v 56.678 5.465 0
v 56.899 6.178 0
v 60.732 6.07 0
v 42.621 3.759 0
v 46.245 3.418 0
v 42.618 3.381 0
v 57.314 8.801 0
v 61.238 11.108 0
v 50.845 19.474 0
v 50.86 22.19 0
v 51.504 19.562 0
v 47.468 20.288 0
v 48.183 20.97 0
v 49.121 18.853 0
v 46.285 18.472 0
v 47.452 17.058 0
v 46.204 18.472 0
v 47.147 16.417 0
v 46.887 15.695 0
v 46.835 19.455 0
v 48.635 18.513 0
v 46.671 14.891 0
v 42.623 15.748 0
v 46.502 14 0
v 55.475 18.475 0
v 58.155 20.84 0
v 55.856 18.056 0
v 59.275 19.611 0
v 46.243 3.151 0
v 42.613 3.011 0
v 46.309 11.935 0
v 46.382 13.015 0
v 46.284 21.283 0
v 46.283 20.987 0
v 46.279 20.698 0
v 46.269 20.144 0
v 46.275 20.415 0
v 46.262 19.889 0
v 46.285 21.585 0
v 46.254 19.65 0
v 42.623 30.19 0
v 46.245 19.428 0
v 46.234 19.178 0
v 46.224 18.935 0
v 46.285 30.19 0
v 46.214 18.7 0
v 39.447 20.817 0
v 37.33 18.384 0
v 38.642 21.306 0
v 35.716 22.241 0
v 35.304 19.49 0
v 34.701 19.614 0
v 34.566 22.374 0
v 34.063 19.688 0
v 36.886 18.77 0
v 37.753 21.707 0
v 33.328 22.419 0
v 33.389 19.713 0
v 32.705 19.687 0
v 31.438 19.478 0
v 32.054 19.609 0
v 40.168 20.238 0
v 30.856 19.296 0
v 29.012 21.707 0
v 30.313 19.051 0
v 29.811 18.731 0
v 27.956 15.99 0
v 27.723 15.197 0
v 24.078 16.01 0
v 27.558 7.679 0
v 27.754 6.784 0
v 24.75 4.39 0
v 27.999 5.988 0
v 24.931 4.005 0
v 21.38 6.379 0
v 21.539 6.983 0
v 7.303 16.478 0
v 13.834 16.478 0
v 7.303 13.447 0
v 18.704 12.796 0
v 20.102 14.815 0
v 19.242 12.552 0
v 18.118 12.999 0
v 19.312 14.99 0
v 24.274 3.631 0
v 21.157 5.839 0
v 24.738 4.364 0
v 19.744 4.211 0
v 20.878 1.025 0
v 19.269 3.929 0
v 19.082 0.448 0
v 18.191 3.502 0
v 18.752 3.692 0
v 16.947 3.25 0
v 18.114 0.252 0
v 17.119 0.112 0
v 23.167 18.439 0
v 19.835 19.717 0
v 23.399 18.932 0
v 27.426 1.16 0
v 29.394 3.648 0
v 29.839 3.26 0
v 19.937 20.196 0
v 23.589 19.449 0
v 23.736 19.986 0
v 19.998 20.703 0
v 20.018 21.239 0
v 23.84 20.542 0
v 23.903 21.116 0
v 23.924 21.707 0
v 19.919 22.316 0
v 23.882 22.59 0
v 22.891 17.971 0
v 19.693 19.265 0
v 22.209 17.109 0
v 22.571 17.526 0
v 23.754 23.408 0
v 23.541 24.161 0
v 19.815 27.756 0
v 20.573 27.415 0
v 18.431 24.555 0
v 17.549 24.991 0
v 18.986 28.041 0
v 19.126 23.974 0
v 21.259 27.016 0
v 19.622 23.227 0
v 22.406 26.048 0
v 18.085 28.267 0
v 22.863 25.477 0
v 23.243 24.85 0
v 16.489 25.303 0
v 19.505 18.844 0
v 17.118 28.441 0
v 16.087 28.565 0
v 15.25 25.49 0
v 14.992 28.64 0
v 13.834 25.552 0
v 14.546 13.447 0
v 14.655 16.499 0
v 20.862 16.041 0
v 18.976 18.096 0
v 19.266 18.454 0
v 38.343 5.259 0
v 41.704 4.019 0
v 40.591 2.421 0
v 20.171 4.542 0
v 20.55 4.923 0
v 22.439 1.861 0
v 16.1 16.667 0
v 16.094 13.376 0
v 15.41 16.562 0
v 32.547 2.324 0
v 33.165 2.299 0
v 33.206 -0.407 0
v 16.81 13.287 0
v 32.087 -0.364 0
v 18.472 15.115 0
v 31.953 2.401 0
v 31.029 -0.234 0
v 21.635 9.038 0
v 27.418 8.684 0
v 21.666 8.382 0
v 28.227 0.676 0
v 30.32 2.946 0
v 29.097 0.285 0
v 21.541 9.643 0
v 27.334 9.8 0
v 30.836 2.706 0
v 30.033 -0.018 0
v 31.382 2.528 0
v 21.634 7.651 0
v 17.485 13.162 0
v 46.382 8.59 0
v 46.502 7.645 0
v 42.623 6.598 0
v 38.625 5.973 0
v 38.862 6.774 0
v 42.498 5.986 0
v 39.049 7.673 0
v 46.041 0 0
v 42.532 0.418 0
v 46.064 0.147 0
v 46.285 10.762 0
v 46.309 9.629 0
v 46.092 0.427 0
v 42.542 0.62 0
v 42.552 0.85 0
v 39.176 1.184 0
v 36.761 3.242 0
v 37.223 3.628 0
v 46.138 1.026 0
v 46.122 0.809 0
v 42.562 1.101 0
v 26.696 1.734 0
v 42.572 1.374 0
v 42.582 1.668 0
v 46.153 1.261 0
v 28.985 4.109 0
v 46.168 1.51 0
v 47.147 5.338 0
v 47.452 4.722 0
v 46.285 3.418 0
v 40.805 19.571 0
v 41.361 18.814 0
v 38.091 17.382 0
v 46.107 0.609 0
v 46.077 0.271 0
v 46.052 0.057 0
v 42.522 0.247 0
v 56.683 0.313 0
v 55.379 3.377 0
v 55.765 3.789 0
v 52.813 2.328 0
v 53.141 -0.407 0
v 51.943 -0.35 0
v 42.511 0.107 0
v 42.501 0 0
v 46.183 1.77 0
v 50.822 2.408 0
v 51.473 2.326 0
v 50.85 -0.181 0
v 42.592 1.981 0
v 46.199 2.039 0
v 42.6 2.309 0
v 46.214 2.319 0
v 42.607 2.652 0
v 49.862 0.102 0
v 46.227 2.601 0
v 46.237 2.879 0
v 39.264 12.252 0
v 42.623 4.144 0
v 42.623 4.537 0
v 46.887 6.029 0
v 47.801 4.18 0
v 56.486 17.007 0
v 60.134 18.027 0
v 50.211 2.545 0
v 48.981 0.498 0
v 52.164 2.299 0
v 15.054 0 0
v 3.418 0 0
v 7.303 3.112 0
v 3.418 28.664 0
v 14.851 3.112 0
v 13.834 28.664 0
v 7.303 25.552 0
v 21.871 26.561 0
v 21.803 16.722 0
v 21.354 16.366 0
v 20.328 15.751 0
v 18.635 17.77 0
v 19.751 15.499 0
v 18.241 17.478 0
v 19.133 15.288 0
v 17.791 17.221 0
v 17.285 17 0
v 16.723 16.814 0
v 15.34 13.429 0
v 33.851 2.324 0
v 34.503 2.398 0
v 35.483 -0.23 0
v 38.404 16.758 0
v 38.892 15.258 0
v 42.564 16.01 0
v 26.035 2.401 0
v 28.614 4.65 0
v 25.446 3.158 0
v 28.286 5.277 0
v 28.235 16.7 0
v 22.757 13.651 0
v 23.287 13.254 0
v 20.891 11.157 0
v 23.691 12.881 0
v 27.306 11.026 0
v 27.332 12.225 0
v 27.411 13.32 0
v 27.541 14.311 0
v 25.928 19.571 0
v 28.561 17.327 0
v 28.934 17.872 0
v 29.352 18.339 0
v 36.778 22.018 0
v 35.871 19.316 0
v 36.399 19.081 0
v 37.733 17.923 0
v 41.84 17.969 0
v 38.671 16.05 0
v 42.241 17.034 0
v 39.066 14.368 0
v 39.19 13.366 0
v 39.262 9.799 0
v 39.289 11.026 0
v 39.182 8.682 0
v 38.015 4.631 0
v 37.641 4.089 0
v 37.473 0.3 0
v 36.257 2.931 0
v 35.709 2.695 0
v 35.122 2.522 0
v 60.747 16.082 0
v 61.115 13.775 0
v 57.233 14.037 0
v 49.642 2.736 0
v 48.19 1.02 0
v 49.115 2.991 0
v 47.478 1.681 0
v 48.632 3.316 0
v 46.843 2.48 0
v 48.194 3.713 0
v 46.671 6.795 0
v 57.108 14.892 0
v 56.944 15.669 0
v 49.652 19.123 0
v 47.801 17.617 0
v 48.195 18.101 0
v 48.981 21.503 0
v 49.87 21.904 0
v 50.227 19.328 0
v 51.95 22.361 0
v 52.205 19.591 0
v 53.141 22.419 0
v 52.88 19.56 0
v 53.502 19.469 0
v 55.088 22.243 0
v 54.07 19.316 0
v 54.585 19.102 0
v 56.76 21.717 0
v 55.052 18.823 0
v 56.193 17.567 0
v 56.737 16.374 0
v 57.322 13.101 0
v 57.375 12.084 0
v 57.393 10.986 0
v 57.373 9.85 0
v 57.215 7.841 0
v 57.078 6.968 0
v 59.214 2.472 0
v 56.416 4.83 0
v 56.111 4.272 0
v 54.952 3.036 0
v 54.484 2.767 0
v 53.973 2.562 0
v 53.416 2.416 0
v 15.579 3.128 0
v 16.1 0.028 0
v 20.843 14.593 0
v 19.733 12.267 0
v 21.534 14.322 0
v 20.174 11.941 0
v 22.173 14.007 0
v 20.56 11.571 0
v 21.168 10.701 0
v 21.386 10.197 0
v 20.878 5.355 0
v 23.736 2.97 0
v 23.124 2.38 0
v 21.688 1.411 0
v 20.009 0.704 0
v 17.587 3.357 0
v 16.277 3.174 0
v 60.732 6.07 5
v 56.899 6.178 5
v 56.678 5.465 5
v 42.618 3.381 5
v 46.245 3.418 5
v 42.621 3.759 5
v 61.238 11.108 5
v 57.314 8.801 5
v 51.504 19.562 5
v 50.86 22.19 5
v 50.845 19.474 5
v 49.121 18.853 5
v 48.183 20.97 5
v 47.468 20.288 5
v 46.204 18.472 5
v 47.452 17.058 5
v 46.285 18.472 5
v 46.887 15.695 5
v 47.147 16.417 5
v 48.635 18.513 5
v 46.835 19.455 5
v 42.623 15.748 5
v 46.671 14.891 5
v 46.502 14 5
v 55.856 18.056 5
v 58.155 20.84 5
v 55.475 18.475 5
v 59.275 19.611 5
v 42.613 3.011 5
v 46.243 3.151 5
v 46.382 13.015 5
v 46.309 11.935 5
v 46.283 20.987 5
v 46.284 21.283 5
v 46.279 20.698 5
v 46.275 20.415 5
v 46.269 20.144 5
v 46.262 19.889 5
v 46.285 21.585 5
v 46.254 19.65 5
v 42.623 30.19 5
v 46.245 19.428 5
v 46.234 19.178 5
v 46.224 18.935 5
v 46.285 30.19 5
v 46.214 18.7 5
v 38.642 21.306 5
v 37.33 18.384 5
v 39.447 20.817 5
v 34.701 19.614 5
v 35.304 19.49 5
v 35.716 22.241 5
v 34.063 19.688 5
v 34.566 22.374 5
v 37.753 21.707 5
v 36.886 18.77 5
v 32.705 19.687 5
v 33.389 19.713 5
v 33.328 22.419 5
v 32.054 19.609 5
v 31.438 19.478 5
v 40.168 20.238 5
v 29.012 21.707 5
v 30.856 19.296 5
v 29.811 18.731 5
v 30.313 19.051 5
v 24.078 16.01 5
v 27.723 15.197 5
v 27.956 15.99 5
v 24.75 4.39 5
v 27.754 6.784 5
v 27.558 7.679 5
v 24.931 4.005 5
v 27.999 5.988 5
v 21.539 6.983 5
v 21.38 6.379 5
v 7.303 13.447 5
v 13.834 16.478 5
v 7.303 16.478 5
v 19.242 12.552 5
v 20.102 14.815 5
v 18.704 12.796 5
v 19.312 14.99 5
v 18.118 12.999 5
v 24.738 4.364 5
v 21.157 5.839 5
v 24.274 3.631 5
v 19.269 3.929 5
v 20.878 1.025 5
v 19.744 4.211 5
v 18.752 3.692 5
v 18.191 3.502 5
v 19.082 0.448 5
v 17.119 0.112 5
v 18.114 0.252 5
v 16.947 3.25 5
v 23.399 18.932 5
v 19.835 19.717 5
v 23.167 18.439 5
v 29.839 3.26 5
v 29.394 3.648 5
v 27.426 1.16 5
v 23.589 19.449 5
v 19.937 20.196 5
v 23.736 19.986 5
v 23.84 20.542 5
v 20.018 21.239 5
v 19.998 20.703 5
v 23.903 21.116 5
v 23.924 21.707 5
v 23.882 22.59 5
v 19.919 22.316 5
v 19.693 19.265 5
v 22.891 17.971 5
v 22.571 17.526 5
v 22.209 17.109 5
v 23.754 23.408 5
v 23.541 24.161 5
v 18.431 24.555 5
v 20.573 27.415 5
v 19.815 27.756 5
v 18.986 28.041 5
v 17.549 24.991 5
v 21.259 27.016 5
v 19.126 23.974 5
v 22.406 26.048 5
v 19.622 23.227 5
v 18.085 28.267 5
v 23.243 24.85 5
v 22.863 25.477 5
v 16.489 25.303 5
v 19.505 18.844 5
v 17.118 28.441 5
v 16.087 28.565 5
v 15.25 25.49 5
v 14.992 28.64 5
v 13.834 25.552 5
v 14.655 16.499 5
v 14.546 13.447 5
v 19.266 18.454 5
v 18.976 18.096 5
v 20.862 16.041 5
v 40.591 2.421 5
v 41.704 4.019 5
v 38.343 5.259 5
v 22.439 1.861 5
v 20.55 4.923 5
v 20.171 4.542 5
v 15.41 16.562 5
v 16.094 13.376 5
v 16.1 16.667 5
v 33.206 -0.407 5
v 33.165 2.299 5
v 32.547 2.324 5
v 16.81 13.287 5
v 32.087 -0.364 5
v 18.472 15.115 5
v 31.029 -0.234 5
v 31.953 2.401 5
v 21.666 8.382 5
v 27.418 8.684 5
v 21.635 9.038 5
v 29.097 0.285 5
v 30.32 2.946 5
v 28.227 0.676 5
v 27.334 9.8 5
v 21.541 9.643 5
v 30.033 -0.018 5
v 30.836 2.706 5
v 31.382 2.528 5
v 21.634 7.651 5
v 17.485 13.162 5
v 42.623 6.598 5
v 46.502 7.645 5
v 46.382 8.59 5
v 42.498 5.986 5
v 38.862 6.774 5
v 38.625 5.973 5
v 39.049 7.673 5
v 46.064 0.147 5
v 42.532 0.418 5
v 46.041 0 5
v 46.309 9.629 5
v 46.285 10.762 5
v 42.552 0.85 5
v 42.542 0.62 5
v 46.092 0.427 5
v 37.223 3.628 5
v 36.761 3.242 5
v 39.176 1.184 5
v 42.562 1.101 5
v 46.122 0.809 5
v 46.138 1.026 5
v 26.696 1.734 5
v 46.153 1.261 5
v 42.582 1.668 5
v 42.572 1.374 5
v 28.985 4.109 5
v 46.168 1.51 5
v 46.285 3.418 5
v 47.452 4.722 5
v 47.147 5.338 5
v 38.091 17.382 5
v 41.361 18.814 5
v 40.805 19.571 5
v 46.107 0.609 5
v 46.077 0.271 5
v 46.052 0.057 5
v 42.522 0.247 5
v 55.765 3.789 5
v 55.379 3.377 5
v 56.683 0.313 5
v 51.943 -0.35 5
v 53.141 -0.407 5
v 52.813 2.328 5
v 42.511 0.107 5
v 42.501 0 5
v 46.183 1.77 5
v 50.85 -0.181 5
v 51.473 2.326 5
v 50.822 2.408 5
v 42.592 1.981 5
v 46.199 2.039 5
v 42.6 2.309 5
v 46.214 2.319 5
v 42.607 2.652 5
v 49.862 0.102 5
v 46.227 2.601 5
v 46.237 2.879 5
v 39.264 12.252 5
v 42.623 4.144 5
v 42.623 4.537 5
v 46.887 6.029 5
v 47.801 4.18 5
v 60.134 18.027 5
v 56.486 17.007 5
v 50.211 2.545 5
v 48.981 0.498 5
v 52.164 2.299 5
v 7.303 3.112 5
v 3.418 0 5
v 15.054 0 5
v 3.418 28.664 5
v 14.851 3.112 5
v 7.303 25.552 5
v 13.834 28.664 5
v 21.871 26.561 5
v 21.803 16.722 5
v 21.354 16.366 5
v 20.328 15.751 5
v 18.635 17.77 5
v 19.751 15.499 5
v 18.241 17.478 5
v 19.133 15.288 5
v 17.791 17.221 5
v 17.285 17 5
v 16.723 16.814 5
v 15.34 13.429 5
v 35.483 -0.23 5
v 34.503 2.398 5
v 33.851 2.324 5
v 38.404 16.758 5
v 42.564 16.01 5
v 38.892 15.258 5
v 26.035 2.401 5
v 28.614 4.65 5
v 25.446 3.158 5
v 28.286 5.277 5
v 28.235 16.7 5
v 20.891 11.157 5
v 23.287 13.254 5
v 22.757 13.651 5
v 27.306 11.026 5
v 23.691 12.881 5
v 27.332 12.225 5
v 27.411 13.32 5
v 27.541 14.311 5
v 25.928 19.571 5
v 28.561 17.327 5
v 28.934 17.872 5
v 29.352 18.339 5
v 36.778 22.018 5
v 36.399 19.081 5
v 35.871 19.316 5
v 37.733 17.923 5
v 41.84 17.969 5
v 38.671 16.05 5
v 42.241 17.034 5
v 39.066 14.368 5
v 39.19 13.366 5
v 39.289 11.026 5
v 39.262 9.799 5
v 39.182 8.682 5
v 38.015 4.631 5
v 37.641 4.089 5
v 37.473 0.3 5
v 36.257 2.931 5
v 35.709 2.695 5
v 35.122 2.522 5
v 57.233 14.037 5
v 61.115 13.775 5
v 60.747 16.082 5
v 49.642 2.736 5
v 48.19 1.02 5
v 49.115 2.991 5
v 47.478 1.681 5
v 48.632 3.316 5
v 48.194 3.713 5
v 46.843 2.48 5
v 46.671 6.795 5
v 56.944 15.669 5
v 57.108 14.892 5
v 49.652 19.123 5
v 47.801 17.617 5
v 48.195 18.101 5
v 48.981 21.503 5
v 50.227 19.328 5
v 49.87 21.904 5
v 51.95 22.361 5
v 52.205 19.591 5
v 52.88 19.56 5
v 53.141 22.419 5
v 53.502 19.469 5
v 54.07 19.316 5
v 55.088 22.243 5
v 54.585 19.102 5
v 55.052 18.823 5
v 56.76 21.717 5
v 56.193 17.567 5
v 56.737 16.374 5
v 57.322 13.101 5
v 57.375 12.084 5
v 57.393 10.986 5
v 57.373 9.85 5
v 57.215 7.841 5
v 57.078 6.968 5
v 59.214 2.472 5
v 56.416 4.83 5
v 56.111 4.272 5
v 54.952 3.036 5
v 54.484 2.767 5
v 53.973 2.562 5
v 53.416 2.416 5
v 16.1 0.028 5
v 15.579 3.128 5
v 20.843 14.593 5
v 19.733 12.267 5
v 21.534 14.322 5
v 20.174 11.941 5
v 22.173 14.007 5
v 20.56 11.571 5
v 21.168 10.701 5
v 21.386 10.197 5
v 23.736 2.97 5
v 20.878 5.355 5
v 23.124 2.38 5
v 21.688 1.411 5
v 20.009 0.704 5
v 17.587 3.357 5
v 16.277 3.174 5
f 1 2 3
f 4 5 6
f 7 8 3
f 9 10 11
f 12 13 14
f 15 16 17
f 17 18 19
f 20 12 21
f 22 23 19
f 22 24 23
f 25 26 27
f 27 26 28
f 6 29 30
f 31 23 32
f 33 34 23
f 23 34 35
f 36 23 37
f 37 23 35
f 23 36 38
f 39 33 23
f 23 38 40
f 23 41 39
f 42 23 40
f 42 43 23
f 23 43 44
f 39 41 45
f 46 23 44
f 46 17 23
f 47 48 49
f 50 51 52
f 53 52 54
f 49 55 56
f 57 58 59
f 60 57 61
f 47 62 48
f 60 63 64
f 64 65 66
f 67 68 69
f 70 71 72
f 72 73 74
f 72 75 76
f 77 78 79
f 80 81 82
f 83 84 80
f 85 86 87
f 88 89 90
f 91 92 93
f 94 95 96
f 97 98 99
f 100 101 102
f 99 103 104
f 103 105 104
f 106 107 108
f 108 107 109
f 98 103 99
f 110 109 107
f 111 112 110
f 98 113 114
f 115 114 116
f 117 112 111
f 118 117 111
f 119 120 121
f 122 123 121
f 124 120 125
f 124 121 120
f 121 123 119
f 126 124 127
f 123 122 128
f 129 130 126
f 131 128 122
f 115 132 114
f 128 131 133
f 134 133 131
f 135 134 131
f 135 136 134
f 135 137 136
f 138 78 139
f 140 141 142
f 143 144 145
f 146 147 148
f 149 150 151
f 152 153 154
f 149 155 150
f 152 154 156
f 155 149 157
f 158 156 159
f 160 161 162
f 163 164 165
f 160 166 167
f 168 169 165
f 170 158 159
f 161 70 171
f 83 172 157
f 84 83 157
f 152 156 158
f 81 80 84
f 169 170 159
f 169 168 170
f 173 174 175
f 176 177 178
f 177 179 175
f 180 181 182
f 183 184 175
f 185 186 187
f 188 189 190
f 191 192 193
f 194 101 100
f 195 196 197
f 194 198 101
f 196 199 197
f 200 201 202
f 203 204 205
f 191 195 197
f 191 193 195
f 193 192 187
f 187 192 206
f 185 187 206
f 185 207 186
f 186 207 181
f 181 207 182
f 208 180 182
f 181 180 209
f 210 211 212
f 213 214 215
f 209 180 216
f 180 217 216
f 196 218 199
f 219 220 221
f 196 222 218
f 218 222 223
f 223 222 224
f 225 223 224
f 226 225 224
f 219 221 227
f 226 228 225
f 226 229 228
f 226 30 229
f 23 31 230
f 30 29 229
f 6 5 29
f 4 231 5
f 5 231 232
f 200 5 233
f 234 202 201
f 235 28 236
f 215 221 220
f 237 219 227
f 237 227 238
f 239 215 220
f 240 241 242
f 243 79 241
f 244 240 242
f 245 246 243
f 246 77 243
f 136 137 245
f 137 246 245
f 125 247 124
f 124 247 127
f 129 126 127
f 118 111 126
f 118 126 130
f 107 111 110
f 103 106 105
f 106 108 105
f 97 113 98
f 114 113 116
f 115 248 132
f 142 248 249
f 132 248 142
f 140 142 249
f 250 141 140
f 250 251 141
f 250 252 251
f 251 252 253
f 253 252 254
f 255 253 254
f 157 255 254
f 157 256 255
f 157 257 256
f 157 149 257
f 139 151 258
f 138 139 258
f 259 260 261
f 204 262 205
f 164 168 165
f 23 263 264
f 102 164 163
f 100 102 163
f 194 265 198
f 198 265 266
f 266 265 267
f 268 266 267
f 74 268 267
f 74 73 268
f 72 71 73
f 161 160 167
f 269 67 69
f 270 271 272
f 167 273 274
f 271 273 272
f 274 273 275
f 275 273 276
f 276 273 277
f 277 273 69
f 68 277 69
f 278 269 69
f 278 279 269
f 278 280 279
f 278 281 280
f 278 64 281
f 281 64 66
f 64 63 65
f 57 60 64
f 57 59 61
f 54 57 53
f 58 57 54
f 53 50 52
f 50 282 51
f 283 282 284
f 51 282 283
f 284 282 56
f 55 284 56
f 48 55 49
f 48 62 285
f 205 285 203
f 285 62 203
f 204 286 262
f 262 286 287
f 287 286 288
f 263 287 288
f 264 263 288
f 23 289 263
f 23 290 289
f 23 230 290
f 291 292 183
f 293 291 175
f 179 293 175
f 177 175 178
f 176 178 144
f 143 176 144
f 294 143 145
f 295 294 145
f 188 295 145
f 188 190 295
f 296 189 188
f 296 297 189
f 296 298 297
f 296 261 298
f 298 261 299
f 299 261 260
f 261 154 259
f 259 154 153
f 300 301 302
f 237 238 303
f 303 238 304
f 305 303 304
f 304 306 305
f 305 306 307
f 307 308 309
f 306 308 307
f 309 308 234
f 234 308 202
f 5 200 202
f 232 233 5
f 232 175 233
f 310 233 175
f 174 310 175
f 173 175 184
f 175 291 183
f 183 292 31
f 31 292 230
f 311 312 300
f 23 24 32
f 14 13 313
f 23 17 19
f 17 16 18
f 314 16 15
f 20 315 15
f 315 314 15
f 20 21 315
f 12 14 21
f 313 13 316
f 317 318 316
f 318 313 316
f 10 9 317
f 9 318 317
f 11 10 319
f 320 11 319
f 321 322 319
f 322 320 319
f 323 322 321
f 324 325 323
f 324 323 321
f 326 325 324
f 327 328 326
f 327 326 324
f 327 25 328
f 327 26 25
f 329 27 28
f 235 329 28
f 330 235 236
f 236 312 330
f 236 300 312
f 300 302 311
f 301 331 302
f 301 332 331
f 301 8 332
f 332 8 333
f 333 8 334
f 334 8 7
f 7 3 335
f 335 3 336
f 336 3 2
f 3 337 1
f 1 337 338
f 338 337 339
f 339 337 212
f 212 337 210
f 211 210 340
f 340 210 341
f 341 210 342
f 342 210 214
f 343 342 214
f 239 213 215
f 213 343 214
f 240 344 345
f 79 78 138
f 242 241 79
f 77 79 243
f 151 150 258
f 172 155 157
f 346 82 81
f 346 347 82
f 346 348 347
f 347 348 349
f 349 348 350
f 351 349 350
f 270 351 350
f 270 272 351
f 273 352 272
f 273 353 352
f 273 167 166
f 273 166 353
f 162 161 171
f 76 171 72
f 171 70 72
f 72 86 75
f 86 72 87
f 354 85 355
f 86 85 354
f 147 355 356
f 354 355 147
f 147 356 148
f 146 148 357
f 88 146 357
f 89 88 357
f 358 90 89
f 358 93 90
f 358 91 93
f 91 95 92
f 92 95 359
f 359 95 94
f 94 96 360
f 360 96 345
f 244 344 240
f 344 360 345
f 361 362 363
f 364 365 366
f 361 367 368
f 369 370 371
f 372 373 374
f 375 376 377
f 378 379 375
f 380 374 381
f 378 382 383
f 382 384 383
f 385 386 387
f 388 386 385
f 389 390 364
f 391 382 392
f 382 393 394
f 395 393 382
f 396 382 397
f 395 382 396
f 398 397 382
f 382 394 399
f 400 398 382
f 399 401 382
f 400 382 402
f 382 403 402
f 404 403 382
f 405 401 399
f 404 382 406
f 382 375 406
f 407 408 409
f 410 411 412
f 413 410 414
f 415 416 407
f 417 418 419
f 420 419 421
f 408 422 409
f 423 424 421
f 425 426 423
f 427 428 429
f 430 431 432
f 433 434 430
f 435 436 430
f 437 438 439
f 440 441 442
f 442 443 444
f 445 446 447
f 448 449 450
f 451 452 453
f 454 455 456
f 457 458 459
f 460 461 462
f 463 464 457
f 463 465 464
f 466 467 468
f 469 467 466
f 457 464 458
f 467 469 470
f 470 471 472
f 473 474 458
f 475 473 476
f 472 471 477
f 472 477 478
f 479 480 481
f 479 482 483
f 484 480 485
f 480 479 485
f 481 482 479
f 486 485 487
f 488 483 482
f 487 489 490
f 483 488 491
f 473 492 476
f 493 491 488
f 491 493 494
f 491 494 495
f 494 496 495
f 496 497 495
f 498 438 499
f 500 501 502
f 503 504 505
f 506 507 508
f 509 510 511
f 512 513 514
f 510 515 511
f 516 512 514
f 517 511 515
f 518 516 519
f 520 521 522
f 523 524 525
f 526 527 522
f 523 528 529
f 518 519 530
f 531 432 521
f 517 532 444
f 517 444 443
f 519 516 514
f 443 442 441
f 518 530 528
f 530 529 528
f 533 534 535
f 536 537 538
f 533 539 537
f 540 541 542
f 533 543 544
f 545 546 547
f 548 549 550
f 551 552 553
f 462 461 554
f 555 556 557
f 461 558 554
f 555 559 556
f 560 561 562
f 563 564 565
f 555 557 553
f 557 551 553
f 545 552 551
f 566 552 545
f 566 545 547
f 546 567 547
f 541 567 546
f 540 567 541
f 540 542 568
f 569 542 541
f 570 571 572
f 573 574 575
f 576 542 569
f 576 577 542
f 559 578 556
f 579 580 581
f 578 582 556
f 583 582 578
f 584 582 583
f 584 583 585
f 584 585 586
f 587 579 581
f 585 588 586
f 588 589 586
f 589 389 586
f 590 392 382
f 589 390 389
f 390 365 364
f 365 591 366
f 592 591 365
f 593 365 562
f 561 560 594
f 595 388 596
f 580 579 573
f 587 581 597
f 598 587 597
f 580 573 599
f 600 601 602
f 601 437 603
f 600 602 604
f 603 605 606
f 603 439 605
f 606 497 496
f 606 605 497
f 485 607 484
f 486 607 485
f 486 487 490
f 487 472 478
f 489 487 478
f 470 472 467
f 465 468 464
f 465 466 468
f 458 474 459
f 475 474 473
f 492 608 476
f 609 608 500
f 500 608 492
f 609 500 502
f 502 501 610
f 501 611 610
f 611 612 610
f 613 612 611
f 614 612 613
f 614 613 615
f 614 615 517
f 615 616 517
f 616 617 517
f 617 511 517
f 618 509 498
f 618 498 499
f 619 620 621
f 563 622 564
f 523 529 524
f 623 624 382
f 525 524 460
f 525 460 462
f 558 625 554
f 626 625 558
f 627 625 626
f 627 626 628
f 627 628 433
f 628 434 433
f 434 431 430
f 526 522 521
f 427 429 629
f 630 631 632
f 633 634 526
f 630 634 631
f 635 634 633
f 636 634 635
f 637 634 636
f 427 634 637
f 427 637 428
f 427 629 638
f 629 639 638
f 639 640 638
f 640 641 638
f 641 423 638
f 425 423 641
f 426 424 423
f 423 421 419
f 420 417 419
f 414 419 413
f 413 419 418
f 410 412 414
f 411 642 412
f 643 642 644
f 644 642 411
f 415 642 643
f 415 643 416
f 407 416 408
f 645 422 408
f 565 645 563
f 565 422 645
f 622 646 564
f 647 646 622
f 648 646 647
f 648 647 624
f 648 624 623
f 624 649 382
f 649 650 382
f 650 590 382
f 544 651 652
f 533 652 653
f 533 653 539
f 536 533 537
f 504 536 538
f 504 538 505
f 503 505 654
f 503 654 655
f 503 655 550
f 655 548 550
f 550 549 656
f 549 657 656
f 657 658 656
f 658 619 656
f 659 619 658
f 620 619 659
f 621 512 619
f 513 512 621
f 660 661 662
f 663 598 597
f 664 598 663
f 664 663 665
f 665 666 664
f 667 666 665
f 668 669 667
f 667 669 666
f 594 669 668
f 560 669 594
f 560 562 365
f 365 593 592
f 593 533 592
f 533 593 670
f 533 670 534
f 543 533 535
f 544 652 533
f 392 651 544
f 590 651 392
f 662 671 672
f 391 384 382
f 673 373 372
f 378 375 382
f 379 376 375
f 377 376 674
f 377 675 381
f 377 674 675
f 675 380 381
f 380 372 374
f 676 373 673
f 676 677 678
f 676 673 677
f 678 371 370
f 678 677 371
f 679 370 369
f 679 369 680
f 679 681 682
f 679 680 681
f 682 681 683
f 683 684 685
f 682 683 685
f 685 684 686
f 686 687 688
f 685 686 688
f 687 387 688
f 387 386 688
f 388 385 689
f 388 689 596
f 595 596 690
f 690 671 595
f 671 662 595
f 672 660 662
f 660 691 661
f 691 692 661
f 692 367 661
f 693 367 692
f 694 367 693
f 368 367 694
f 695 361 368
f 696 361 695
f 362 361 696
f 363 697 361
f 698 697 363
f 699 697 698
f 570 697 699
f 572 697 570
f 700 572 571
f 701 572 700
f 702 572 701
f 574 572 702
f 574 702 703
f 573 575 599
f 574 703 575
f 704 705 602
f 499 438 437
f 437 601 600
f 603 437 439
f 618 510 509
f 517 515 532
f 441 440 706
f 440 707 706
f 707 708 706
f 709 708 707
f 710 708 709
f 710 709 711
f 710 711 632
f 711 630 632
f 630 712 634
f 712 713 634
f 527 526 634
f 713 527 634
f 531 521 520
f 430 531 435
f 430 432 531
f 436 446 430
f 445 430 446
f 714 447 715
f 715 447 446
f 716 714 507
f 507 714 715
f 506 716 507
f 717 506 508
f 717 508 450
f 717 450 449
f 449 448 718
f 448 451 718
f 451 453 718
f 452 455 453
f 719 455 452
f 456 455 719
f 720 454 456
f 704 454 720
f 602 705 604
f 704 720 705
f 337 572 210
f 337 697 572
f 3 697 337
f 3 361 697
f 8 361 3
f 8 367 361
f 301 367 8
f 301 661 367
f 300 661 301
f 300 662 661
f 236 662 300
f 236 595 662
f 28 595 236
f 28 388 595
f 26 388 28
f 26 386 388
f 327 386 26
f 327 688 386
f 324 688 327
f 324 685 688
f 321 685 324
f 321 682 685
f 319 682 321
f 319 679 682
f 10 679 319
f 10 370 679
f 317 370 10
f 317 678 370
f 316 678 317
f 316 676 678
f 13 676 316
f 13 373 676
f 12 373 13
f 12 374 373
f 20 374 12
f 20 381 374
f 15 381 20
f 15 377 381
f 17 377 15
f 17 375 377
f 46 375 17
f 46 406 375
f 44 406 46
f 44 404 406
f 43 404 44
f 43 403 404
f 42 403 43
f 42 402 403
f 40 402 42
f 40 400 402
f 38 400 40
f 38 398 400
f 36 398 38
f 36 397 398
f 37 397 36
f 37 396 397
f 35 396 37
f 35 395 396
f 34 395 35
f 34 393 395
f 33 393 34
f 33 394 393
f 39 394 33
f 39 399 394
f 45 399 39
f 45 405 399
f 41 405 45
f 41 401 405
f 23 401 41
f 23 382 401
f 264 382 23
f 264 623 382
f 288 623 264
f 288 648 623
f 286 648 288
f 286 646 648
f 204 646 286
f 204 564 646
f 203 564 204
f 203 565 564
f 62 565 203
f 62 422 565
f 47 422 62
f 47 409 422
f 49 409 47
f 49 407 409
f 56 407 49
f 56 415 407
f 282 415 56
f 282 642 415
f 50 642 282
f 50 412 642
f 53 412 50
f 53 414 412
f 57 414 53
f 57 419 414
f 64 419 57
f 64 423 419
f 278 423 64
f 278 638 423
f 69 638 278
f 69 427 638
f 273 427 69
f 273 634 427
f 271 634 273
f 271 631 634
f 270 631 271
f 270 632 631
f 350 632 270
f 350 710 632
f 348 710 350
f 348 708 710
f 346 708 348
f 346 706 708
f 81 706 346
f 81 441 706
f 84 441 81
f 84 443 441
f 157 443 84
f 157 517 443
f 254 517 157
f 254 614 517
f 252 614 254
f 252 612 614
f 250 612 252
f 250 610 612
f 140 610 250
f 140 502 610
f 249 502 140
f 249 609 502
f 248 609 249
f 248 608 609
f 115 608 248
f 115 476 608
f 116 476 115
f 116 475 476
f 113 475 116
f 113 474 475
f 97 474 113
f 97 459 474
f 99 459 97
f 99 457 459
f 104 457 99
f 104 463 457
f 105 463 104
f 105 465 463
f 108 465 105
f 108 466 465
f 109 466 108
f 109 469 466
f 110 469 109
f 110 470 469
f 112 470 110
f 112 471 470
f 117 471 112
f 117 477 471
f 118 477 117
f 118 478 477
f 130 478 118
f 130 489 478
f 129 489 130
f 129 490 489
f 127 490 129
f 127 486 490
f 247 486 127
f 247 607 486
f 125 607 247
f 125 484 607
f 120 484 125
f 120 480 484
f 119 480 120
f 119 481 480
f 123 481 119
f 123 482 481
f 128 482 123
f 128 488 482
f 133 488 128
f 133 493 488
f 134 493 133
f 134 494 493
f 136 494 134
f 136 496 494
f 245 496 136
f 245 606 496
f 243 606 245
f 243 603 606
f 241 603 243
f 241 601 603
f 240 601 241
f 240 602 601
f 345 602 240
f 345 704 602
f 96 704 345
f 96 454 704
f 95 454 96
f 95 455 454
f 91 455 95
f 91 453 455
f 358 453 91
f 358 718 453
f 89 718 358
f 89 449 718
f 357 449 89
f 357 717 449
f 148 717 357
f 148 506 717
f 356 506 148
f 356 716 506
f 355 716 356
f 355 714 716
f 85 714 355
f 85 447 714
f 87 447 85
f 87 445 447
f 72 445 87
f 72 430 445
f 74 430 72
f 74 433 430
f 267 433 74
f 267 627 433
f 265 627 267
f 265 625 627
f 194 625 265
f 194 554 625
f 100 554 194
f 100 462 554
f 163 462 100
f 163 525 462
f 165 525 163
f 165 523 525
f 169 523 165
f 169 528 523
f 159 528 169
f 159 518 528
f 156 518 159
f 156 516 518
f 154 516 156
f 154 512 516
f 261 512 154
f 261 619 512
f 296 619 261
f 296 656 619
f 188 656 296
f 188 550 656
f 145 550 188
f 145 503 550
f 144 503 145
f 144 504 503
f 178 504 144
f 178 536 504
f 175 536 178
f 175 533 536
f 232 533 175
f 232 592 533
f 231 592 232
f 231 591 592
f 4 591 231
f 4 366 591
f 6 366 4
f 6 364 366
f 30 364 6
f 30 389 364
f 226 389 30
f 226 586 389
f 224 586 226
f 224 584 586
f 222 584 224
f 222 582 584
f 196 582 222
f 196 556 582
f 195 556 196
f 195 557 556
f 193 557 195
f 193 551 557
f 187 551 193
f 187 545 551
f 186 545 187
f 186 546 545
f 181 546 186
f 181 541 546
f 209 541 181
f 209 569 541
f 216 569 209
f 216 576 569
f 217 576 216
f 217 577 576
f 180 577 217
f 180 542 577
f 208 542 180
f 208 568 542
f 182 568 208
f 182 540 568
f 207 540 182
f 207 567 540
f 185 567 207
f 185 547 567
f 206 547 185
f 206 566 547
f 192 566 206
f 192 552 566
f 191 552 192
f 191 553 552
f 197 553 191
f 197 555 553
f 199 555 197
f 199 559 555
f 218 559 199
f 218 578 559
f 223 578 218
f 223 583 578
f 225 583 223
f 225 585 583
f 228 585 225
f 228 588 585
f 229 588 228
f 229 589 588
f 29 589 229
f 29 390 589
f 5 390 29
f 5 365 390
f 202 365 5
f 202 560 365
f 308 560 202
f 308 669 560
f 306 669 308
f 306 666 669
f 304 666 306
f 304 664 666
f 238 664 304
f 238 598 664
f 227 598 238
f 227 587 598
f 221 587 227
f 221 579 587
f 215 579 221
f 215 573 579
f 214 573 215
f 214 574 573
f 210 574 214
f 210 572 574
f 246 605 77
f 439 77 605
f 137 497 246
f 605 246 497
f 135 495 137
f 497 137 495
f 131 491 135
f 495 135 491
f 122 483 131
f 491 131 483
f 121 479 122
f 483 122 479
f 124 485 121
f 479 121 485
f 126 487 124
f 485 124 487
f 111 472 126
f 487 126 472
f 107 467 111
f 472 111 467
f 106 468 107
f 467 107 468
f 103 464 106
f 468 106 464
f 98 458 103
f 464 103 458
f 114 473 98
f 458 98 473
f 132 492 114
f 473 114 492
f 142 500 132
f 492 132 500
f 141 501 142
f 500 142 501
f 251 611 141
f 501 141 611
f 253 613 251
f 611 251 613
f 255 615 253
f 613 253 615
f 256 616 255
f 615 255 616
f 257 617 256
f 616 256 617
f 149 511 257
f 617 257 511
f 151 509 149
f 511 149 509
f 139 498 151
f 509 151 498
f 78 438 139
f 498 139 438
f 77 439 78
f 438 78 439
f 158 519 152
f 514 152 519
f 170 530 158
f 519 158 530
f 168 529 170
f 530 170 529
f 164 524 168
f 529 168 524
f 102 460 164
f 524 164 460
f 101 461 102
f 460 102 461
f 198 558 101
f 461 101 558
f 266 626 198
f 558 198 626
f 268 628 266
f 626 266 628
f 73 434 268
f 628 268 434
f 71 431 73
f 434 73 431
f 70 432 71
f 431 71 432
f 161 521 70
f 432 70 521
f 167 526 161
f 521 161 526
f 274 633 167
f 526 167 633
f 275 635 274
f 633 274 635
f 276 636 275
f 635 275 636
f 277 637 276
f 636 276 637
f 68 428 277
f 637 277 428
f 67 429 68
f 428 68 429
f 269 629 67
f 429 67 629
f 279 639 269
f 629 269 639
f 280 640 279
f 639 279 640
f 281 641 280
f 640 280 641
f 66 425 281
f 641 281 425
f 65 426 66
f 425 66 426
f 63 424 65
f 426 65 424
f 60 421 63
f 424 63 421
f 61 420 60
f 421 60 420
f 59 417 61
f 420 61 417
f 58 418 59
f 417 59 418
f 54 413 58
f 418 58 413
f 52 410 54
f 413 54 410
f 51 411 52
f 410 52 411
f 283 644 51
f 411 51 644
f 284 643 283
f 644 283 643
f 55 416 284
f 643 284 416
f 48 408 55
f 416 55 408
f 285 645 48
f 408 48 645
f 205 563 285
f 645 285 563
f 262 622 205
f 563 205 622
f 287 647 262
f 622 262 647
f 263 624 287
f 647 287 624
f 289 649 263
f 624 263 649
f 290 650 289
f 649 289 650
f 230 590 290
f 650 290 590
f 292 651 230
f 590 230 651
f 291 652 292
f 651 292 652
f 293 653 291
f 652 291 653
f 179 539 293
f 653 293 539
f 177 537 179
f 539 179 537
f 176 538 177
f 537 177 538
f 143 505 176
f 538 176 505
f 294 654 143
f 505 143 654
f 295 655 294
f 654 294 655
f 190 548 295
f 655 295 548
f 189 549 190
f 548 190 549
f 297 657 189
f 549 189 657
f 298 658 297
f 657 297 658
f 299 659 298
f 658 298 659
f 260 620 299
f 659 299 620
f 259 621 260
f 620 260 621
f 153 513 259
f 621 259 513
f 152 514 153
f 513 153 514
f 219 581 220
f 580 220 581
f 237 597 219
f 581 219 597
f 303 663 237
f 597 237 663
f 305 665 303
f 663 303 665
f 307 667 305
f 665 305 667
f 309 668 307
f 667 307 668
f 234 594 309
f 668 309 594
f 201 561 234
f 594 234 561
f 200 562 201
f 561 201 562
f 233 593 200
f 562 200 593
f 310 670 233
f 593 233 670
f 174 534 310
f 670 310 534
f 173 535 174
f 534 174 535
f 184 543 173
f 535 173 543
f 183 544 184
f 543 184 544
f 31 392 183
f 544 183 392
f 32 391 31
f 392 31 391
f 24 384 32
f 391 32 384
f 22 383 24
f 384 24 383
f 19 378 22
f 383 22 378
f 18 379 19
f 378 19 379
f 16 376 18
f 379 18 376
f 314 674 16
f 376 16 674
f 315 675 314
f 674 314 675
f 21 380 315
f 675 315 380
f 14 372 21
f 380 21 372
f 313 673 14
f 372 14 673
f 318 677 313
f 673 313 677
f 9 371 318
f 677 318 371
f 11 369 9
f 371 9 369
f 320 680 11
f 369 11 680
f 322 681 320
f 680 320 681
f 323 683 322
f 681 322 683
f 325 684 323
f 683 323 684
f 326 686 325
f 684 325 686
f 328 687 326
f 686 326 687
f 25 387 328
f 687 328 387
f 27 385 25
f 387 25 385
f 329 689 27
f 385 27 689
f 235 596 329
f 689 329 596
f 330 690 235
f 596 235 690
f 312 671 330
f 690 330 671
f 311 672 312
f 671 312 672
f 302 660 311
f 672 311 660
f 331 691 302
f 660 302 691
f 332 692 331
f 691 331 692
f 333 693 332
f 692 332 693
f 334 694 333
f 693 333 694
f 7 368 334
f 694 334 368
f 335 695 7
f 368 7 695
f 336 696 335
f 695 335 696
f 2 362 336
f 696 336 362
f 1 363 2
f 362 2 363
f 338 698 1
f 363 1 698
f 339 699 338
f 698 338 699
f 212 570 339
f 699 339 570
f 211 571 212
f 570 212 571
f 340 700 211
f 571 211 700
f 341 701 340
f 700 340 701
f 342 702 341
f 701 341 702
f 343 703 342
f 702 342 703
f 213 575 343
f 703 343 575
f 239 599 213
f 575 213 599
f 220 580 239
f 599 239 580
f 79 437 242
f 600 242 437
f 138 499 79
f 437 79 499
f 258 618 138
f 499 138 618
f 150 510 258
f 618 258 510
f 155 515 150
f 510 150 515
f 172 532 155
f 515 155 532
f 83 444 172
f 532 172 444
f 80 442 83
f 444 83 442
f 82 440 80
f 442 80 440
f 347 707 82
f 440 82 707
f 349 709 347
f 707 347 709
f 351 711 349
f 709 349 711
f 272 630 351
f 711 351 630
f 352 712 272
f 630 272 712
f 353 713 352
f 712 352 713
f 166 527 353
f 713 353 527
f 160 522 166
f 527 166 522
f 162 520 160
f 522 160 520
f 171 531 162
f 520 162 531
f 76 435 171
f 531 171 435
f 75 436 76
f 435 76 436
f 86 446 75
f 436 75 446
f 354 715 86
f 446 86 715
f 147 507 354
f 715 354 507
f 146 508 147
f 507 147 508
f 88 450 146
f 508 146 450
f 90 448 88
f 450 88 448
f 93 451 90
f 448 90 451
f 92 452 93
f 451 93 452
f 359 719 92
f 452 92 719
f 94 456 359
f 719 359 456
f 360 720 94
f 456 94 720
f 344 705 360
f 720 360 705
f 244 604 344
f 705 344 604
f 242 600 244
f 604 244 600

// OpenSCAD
linear_extrude(height = 5) {
text("Bob", size=30, spacing = 0.8);
}
